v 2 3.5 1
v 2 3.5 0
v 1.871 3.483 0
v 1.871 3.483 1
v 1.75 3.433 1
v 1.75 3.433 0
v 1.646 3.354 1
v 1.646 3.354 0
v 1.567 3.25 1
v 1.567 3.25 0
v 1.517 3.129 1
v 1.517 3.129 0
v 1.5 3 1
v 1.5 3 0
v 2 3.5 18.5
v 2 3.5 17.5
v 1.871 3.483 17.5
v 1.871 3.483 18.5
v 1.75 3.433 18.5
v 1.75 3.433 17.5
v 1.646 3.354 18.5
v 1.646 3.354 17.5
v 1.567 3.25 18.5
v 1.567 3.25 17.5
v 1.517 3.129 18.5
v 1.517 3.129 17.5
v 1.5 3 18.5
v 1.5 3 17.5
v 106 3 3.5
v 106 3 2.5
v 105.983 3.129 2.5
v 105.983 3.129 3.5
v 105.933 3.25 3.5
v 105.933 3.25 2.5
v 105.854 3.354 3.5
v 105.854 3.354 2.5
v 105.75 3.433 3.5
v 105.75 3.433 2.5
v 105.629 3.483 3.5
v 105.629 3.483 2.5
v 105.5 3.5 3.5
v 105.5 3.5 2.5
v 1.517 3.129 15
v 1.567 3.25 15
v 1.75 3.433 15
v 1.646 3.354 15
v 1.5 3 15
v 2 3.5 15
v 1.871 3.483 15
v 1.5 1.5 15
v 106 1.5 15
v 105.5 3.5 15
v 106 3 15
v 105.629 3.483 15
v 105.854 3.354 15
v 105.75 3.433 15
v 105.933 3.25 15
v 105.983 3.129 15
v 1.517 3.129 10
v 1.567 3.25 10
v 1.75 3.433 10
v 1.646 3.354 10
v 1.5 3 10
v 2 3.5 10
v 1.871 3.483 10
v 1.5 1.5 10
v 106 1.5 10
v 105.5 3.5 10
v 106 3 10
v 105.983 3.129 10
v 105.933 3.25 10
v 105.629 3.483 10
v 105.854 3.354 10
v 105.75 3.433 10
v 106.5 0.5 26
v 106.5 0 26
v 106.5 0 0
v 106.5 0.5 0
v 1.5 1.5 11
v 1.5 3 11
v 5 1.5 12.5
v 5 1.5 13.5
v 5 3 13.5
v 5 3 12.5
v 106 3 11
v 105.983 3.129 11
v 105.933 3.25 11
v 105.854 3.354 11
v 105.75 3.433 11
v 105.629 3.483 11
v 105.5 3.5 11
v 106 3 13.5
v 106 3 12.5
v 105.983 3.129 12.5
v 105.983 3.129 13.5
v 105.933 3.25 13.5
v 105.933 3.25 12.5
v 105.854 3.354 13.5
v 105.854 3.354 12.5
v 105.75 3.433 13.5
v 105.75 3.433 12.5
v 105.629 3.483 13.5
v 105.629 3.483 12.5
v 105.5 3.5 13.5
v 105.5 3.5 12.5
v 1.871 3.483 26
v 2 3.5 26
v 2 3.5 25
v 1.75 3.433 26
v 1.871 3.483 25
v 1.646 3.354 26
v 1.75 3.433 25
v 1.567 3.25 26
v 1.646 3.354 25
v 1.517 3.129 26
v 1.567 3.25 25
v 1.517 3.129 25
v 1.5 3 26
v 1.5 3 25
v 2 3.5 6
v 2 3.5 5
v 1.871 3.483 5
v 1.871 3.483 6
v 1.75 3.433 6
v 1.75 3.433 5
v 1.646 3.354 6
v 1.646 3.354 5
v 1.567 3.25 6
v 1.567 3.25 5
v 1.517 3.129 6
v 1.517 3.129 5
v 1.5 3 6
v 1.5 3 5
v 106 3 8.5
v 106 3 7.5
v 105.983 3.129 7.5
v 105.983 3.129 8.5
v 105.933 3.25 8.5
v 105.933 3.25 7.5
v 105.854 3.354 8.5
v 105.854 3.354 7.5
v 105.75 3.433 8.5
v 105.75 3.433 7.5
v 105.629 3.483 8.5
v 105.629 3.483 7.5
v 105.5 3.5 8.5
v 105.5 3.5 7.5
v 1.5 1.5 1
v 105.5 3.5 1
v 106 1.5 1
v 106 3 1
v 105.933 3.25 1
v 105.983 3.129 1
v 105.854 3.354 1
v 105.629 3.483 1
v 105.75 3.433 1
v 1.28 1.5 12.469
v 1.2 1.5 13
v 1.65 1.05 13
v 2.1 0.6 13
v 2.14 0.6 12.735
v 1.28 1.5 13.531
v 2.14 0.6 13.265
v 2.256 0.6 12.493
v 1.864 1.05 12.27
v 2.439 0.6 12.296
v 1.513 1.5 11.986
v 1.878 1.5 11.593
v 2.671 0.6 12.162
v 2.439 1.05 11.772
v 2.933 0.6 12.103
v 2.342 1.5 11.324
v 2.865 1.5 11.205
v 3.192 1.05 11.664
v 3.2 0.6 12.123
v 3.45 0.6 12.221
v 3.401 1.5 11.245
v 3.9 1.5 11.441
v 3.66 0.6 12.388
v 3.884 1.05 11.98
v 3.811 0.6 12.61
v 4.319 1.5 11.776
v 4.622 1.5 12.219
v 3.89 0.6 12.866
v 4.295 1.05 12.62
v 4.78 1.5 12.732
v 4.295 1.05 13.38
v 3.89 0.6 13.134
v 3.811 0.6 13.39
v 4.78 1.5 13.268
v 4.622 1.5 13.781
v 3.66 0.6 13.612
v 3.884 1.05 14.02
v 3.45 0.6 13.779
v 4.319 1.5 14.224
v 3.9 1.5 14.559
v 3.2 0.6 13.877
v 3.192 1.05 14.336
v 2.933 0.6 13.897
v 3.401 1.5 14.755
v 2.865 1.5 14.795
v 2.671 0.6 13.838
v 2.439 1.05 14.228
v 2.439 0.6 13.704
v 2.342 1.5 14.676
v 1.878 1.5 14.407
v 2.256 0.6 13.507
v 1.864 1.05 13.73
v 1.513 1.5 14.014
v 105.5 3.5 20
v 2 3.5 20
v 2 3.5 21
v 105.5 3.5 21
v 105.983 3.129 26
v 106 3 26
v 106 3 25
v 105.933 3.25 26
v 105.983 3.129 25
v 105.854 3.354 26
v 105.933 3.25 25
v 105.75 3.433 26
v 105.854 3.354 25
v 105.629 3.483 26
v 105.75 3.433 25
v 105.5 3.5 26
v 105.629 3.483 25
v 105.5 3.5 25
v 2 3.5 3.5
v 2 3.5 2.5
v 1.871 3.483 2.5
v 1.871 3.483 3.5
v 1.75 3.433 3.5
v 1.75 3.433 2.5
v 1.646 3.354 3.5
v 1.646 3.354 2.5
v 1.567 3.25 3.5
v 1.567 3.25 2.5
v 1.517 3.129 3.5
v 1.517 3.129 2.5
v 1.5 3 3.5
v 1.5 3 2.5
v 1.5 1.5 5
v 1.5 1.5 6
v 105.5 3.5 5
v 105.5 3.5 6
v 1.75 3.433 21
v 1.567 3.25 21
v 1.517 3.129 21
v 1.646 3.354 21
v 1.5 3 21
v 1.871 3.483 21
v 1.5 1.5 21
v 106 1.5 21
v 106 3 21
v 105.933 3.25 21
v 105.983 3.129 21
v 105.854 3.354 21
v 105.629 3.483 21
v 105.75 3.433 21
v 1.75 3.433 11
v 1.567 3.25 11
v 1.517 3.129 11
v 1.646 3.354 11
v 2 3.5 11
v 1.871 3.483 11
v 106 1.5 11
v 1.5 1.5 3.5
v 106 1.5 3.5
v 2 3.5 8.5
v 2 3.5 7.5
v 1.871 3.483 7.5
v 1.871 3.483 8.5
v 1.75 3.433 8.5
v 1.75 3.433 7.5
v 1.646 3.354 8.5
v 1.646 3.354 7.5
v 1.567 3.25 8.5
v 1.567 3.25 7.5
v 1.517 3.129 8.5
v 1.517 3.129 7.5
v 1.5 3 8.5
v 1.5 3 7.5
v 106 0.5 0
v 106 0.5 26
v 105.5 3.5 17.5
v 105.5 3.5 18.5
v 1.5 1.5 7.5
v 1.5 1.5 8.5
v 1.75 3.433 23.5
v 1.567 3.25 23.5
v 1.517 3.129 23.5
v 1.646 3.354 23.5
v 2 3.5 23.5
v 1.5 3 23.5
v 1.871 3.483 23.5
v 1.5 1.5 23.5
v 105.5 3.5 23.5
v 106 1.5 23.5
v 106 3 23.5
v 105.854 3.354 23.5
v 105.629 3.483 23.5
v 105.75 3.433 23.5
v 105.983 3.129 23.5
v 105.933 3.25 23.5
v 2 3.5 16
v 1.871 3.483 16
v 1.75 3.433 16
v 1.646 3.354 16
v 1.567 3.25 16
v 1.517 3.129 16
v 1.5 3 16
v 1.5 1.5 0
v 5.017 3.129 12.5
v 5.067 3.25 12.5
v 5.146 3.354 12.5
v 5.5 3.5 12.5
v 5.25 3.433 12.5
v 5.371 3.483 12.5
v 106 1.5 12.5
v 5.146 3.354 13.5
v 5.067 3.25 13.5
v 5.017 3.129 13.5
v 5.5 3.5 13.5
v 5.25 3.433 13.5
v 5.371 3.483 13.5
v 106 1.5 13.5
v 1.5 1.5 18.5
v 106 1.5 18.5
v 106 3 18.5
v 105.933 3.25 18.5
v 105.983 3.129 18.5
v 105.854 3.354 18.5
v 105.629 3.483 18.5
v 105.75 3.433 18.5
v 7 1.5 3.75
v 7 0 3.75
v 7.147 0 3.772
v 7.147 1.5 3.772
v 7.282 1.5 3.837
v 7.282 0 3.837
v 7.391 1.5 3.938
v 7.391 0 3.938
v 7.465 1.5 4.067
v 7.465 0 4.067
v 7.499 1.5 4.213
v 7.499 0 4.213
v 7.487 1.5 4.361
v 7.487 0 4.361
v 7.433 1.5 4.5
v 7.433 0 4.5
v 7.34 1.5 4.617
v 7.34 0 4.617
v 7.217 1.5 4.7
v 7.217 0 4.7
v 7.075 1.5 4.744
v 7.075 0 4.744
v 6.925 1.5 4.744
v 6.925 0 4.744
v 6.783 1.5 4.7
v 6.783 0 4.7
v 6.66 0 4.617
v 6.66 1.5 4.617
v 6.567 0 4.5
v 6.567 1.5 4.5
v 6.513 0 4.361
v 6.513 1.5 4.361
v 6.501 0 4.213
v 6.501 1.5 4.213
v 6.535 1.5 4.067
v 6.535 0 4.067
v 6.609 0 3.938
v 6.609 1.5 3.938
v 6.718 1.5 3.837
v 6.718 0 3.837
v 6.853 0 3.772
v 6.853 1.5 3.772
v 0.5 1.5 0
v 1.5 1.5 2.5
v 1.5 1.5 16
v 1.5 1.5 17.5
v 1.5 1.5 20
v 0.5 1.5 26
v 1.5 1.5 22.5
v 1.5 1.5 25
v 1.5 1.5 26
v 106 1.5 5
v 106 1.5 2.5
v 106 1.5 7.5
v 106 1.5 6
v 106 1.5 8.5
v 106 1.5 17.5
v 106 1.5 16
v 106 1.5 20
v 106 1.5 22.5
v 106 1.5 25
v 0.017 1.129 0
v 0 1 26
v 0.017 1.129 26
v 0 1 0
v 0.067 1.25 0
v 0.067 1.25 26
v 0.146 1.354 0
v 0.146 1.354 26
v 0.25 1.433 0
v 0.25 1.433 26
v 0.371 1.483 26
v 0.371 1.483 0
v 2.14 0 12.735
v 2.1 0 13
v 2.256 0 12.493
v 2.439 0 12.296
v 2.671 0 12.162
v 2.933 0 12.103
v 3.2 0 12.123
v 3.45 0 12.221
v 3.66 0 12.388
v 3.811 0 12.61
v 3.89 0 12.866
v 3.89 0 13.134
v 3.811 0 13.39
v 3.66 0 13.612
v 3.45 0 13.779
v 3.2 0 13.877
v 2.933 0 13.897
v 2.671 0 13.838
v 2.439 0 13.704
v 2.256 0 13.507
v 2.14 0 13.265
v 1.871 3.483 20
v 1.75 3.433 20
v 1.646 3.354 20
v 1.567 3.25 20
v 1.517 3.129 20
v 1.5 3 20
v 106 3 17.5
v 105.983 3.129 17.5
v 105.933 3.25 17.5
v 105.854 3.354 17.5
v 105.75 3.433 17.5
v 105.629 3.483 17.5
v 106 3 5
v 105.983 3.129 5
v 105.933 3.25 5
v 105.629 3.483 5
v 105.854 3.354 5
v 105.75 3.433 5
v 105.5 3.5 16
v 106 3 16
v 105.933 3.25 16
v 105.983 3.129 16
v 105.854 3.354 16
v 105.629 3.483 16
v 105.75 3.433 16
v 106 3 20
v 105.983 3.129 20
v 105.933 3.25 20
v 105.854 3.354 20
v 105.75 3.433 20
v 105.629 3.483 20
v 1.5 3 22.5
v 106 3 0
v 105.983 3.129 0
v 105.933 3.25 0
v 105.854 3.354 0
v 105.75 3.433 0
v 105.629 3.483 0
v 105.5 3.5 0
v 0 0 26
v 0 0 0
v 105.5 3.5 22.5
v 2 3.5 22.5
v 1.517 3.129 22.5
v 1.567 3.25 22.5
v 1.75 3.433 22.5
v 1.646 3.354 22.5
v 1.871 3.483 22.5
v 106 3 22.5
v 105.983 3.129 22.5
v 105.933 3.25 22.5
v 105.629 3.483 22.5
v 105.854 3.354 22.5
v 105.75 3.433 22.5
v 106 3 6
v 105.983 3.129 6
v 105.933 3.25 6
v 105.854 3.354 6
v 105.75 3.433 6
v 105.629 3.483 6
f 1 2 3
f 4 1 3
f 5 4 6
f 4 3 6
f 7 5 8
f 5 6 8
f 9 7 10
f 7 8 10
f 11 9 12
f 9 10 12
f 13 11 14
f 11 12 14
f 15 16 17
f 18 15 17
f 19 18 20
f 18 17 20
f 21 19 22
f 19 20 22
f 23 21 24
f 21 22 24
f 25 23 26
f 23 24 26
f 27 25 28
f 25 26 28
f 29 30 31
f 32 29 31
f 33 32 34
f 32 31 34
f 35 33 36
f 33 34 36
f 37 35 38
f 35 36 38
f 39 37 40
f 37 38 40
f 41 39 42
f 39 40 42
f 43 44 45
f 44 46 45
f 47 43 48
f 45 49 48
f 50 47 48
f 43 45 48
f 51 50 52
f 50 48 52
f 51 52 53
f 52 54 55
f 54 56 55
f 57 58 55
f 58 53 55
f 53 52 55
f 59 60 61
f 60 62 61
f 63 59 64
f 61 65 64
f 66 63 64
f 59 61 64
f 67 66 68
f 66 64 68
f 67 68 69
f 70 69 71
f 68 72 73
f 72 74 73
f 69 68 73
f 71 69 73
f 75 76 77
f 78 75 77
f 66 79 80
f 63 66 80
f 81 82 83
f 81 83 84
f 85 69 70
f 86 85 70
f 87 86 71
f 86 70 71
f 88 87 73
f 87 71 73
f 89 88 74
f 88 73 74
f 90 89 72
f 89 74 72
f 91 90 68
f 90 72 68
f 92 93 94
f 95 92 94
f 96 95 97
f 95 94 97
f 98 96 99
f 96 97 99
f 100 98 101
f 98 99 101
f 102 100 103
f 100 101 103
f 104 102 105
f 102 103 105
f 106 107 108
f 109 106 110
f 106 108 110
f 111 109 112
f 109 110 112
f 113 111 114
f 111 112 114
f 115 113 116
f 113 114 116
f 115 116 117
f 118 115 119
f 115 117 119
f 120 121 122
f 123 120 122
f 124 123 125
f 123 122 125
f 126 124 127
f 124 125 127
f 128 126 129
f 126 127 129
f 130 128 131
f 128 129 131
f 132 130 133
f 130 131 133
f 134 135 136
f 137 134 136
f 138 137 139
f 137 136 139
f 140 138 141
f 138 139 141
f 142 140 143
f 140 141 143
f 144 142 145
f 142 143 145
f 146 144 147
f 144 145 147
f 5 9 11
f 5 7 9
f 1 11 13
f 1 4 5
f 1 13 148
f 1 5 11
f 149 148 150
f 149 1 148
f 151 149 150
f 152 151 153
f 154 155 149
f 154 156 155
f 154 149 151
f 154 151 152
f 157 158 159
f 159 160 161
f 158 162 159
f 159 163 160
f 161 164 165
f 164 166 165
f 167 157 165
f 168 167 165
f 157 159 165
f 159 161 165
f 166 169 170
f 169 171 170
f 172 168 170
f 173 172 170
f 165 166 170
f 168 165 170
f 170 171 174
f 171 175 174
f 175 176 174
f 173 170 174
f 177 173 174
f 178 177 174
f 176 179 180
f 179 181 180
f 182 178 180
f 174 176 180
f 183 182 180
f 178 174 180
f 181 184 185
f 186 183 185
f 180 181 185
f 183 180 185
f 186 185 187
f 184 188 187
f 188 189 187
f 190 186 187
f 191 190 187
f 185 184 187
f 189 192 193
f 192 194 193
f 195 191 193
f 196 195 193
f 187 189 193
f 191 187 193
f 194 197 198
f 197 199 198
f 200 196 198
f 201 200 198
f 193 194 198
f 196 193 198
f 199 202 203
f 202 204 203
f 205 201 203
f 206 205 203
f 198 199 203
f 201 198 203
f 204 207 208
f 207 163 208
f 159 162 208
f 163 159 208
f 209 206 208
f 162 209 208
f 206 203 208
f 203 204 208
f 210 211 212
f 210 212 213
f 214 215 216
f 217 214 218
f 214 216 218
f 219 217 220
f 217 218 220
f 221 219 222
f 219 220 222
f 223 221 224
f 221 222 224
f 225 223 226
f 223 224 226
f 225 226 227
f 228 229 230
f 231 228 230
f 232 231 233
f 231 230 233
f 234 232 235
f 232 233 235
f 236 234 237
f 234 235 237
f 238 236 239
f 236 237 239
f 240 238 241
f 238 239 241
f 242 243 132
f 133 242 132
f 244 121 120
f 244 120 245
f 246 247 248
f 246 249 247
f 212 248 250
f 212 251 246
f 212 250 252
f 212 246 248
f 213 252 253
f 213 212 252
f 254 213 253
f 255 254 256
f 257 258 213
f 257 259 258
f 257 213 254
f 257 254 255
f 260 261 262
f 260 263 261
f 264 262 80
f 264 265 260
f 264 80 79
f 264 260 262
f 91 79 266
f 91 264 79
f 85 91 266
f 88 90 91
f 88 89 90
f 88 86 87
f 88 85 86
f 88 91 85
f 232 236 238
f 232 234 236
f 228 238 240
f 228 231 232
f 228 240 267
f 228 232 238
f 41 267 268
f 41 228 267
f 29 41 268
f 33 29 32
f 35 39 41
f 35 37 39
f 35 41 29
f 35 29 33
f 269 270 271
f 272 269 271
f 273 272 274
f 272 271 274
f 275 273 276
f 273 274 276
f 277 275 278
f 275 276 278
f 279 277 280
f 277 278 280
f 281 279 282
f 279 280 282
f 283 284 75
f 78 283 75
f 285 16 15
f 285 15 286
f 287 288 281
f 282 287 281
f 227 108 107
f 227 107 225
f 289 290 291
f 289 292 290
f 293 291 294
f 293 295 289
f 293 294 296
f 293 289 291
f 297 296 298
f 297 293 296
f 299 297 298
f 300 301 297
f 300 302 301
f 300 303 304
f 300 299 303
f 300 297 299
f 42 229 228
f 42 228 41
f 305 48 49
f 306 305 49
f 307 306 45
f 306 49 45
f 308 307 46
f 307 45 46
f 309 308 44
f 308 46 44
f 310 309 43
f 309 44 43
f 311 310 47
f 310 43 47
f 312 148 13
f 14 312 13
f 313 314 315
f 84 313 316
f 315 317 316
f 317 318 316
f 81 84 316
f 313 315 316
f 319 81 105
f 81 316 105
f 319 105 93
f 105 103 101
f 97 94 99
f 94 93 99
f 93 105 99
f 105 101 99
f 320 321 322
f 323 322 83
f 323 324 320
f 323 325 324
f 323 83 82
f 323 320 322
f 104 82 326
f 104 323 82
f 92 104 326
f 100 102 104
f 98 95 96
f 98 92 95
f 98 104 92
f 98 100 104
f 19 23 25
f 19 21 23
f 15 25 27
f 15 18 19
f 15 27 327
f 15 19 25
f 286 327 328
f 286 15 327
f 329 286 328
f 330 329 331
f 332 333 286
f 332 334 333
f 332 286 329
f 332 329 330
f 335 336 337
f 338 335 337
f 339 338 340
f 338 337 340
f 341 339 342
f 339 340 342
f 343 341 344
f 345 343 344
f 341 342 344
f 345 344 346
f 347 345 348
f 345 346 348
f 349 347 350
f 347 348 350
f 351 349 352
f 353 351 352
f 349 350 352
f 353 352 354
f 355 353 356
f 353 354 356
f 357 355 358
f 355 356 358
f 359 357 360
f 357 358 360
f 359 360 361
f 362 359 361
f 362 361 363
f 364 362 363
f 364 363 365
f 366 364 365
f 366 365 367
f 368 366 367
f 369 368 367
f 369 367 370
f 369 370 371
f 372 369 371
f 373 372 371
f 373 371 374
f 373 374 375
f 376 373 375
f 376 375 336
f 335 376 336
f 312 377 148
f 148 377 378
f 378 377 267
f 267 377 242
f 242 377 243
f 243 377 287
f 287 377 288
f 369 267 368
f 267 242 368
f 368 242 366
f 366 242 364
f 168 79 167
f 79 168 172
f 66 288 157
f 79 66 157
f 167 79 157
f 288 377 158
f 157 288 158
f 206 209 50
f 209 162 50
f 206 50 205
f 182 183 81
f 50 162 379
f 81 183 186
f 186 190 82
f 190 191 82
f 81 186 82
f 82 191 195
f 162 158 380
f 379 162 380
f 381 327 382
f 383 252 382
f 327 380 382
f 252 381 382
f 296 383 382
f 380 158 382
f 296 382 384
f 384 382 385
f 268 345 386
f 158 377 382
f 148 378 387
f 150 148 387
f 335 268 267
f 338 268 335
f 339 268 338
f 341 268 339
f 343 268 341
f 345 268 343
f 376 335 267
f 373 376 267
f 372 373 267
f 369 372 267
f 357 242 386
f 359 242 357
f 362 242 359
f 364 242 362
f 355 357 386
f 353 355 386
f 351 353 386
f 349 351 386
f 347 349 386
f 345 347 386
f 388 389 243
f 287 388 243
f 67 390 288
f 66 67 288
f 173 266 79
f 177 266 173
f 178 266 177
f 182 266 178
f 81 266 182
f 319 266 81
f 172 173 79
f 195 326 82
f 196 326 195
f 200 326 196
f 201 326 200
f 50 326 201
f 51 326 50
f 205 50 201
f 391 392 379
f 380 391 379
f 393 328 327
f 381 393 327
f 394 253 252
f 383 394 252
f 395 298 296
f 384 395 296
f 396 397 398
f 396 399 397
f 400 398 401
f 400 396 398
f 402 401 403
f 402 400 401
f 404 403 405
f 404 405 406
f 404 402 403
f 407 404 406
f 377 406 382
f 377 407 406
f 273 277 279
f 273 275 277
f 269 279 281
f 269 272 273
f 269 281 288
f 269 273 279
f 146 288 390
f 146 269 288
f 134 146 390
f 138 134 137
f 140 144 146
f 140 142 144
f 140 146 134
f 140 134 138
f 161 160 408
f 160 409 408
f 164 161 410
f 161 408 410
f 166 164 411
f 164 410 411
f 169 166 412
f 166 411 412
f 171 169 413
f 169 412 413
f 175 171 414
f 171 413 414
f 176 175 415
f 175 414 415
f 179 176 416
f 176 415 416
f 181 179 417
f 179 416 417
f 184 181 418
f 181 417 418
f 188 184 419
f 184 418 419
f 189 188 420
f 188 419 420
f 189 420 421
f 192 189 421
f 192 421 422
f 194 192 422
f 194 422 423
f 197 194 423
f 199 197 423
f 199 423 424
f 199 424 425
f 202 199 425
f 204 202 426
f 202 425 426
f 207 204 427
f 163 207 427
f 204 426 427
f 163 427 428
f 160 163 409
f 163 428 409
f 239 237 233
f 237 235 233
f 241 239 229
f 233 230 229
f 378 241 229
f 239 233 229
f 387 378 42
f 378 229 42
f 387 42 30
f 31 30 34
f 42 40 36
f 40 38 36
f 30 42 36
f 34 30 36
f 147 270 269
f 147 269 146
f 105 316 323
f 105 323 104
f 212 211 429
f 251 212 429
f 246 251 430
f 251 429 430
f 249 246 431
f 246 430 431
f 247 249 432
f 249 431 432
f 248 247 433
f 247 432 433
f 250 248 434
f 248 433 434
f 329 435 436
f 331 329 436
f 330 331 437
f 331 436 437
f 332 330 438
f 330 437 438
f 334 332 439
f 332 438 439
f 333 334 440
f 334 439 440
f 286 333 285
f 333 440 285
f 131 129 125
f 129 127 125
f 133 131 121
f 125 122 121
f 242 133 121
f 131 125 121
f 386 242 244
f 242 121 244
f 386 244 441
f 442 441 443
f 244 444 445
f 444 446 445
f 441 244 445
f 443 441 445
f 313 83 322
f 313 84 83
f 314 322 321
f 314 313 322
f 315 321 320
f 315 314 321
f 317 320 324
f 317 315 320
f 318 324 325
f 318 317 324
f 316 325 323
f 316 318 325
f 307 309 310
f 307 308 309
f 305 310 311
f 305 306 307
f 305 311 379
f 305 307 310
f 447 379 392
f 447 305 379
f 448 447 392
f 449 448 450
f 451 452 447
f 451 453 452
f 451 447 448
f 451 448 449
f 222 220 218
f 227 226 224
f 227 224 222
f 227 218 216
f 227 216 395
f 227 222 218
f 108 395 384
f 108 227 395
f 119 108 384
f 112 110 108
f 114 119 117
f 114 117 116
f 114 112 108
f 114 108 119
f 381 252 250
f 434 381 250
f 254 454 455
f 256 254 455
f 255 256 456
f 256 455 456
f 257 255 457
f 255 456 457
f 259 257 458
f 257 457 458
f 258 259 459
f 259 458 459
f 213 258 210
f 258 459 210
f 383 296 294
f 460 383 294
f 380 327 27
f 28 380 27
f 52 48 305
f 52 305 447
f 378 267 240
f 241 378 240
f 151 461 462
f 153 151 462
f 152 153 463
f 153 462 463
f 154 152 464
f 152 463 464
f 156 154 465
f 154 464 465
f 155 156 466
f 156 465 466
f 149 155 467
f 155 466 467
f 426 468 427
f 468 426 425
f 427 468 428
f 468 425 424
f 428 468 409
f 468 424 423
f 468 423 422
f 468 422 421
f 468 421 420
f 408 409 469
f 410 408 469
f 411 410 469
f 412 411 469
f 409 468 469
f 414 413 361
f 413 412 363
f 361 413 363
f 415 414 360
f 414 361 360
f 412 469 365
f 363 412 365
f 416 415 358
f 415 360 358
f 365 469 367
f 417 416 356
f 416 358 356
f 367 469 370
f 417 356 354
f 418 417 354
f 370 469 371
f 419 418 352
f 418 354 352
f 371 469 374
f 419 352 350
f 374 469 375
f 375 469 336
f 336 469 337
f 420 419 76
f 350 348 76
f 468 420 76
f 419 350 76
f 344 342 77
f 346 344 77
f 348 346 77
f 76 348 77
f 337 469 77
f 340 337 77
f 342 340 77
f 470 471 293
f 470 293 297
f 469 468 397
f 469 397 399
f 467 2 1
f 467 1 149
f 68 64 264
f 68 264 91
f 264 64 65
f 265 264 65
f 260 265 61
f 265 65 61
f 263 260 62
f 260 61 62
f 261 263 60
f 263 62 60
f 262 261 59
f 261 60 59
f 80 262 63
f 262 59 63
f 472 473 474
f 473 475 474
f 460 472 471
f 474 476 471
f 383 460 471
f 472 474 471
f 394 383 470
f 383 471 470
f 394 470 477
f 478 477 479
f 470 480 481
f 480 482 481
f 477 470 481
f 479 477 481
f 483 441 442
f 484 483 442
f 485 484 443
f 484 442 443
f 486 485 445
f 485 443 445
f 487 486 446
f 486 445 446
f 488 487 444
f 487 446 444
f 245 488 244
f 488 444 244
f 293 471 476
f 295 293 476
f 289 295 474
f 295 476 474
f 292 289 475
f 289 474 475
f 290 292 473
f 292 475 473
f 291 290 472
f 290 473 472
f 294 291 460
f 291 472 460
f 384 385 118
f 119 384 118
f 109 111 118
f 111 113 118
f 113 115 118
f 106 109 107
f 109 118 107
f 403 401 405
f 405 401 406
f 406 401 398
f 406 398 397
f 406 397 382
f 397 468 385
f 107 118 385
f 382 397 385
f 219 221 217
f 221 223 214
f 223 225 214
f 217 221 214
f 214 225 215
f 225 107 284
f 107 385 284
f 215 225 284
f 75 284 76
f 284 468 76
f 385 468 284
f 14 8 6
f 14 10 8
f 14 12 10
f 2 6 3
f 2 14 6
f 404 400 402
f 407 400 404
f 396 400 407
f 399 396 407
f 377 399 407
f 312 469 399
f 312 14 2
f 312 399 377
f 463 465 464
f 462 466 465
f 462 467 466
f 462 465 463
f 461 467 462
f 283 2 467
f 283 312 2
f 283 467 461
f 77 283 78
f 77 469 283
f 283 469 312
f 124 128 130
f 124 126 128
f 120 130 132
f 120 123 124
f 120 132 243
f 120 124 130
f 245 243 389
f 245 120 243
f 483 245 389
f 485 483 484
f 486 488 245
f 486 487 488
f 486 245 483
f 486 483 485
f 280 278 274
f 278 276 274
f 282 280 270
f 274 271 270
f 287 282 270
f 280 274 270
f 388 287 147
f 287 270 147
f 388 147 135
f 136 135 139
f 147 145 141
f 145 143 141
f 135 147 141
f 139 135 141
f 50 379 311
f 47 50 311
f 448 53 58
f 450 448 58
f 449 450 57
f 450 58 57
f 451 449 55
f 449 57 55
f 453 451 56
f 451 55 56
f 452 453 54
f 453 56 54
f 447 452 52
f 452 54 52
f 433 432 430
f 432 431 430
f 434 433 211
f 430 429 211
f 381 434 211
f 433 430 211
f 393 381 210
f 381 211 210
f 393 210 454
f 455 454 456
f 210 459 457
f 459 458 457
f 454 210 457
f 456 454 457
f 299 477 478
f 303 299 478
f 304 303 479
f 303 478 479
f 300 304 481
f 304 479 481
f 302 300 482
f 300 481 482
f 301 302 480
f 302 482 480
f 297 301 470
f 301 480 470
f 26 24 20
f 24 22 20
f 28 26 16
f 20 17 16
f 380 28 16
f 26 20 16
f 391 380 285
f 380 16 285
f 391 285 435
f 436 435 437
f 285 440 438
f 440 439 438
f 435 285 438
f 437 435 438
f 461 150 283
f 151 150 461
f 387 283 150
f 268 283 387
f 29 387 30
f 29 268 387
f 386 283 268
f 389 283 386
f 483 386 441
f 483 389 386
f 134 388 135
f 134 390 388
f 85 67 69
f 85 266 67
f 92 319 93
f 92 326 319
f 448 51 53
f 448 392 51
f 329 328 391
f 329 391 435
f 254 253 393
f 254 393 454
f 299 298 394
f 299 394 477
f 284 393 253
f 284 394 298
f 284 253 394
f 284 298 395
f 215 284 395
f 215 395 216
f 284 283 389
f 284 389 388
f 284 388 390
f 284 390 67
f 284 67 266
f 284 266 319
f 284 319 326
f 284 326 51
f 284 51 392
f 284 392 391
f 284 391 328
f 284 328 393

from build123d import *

# Parameters (mm, degrees)
SKETCH1_W                                            = 106.5
SKETCH1_H                                            = 26
BOSS_EXTRUDE1_DEPTH                                  = 3.5
SKETCH2_W                                            = 0.5
SKETCH2_H                                            = 3
SKETCH2_W_2                                          = 1.5
SKETCH2_H_2                                          = 2
CUT_EXTRUDE1_DEPTH                                   = 110.683635972
FILLET1_R                                            = 0.5
SKETCH3_W                                            = 107.180882747
SKETCH3_H                                            = 1.5
SKETCH3_W_2                                          = 106.799236883
SKETCH3_W_3                                          = 106.532134073
SKETCH3_W_4                                          = 106.710473135
CUT_EXTRUDE2_DEPTH                                   = 2
SKETCH4_W                                            = 3.5
SKETCH4_H                                            = 1
CUT_EXTRUDE3_DEPTH                                   = 2
CSK_FOR_M1_6_COUNTERSUNK_FLAT_HEAD_SCREW_D           = 1.8
CSK_FOR_M1_6_COUNTERSUNK_FLAT_HEAD_SCREW_DEPTH       = 15
CSK_FOR_M1_6_COUNTERSUNK_FLAT_HEAD_SCREW_CSINK_D     = 3.6
CSK_FOR_M1_6_COUNTERSUNK_FLAT_HEAD_SCREW_CSINK_ANGLE = 90
CSK_FOR_M1_6_COUNTERSUNK_FLAT_HEAD_SCREW_TIP         = 0.540774557
SKETCH11_R                                           = 0.5
CUT_EXTRUDE4_DEPTH                                   = 110.683635972
FILLET2_R                                            = 0.5


with BuildPart() as part:
    # Sketch1 → Boss-Extrude1 (new body)
    with BuildSketch(Plane(origin=(0, 0, 0), x_dir=(1, 0, 0), z_dir=(0, 1, 0))):
        with Locations((53.25, -13)):
            Rectangle(SKETCH1_W, SKETCH1_H)
    extrude(amount=BOSS_EXTRUDE1_DEPTH)

    # Sketch2 → Cut-Extrude1 (cut, through all)
    with BuildSketch(Plane.XY.offset(26)):
        with Locations((106.25, 2)):
            Rectangle(SKETCH2_W, SKETCH2_H)
        with Locations((0.75, 2.5)):
            Rectangle(SKETCH2_W_2, SKETCH2_H_2)
    extrude(amount=-CUT_EXTRUDE1_DEPTH, mode=Mode.SUBTRACT)

    # Fillet1
    fillet1_edges = [part.edges().sort_by_distance(p)[0] for p in [
        (106, 3.5, 13),
        (0, 1.5, 13),
        (1.5, 3.5, 13),
    ]]
    fillet(fillet1_edges, radius=FILLET1_R)

    # Sketch3 → Cut-Extrude2 (cut)
    with BuildSketch(Plane(origin=(0, 3.5, 0), x_dir=(1, 0, 0), z_dir=(0, 1, 0))):
        with Locations((54.409558627, -1.75)):
            Rectangle(SKETCH3_W, SKETCH3_H)
        with Locations((54.310652166, -4.25)):
            Rectangle(SKETCH3_W_2, SKETCH3_H)
        with Locations((54.482997461, -6.75)):
            Rectangle(SKETCH3_W_3, SKETCH3_H)
        with Locations((54.482997461, -9.25)):
            Rectangle(SKETCH3_W_3, SKETCH3_H)
        Polygon((0.819117253, -23.5), (108, -23.5), (106.5, -25), (0.819117253, -25), align=None)
        with Locations((54.310652166, -21.75)):
            Rectangle(SKETCH3_W_2, SKETCH3_H)
        with Locations((54.482997461, -19.25)):
            Rectangle(SKETCH3_W_3, SKETCH3_H)
        with Locations((54.482997461, -16.75)):
            Rectangle(SKETCH3_W_3, SKETCH3_H)
        with Locations((54.496061473, -11.75)):
            Rectangle(SKETCH3_W_4, SKETCH3_H)
        with Locations((54.496061473, -14.25)):
            Rectangle(SKETCH3_W_4, SKETCH3_H)
    extrude(amount=-CUT_EXTRUDE2_DEPTH, mode=Mode.SUBTRACT)

    # Sketch4 → Cut-Extrude3 (cut)
    with BuildSketch(Plane(origin=(0, 1.5, 0), x_dir=(1, 0, 0), z_dir=(0, 1, 0))):
        with Locations((3.25, -13)):
            Rectangle(SKETCH4_W, SKETCH4_H)
        Polygon((1.5, -12.5), (1.5, -11.238548645), (5, -11.238548645), (5, -12.5), (106, -12.5), (106, -11), (1.5, -11), (1.5, -10), (106, -10), (106, -8.5), (1.5, -8.5), (1.5, -7.5), (106, -7.5), (106, -6), (1.5, -6), (1.5, -5), (106, -5), (106, -3.5), (1.5, -3.5), (1.5, -2.5), (106, -2.5), (106, -1), (1.5, -1), (1.5, 0), (0.5, 0), (0.5, -26), (1.5, -26), (1.5, -25), (106, -25), (106, -23.5), (1.5, -23.5), (1.5, -22.5), (106, -22.5), (106, -21), (1.5, -21), (1.5, -20), (106, -20), (106, -18.5), (1.5, -18.5), (1.5, -17.5), (106, -17.5), (106, -16), (1.5, -16), (1.5, -15), (106, -15), (106, -13.5), (5, -13.5), (5, -14.524020237), (1.5, -14.524020237), (1.5, -13.5), align=None)
    extrude(amount=CUT_EXTRUDE3_DEPTH, mode=Mode.SUBTRACT)

    # CSK for M1.6 Countersunk Flat Head Screw2
    with Locations(Plane(origin=(3, 1.5, 13), x_dir=(1, 0, 0), z_dir=(0, 1, 0))):
        with Locations((0, 0)):
            CounterSinkHole(CSK_FOR_M1_6_COUNTERSUNK_FLAT_HEAD_SCREW_D / 2, CSK_FOR_M1_6_COUNTERSUNK_FLAT_HEAD_SCREW_CSINK_D / 2, depth=CSK_FOR_M1_6_COUNTERSUNK_FLAT_HEAD_SCREW_DEPTH, counter_sink_angle=CSK_FOR_M1_6_COUNTERSUNK_FLAT_HEAD_SCREW_CSINK_ANGLE)
            with Locations((0, 0, -(CSK_FOR_M1_6_COUNTERSUNK_FLAT_HEAD_SCREW_DEPTH + CSK_FOR_M1_6_COUNTERSUNK_FLAT_HEAD_SCREW_TIP / 2))):  # 118° drill point
                Cone(0, CSK_FOR_M1_6_COUNTERSUNK_FLAT_HEAD_SCREW_D / 2, CSK_FOR_M1_6_COUNTERSUNK_FLAT_HEAD_SCREW_TIP, mode=Mode.SUBTRACT)

    # Sketch11 → Cut-Extrude4 (cut, through all)
    with BuildSketch(Plane.XZ):
        with Locations(Location((7, 4.25, 0), (0, 0, 270))):
            Circle(SKETCH11_R)
    extrude(amount=-CUT_EXTRUDE4_DEPTH, mode=Mode.SUBTRACT)

    # Fillet2
    fillet2_edges = [part.edges().sort_by_distance(p)[0] for p in [
        (5, 3.5, 13),
    ]]
    fillet(fillet2_edges, radius=FILLET2_R)


solid = part.part
